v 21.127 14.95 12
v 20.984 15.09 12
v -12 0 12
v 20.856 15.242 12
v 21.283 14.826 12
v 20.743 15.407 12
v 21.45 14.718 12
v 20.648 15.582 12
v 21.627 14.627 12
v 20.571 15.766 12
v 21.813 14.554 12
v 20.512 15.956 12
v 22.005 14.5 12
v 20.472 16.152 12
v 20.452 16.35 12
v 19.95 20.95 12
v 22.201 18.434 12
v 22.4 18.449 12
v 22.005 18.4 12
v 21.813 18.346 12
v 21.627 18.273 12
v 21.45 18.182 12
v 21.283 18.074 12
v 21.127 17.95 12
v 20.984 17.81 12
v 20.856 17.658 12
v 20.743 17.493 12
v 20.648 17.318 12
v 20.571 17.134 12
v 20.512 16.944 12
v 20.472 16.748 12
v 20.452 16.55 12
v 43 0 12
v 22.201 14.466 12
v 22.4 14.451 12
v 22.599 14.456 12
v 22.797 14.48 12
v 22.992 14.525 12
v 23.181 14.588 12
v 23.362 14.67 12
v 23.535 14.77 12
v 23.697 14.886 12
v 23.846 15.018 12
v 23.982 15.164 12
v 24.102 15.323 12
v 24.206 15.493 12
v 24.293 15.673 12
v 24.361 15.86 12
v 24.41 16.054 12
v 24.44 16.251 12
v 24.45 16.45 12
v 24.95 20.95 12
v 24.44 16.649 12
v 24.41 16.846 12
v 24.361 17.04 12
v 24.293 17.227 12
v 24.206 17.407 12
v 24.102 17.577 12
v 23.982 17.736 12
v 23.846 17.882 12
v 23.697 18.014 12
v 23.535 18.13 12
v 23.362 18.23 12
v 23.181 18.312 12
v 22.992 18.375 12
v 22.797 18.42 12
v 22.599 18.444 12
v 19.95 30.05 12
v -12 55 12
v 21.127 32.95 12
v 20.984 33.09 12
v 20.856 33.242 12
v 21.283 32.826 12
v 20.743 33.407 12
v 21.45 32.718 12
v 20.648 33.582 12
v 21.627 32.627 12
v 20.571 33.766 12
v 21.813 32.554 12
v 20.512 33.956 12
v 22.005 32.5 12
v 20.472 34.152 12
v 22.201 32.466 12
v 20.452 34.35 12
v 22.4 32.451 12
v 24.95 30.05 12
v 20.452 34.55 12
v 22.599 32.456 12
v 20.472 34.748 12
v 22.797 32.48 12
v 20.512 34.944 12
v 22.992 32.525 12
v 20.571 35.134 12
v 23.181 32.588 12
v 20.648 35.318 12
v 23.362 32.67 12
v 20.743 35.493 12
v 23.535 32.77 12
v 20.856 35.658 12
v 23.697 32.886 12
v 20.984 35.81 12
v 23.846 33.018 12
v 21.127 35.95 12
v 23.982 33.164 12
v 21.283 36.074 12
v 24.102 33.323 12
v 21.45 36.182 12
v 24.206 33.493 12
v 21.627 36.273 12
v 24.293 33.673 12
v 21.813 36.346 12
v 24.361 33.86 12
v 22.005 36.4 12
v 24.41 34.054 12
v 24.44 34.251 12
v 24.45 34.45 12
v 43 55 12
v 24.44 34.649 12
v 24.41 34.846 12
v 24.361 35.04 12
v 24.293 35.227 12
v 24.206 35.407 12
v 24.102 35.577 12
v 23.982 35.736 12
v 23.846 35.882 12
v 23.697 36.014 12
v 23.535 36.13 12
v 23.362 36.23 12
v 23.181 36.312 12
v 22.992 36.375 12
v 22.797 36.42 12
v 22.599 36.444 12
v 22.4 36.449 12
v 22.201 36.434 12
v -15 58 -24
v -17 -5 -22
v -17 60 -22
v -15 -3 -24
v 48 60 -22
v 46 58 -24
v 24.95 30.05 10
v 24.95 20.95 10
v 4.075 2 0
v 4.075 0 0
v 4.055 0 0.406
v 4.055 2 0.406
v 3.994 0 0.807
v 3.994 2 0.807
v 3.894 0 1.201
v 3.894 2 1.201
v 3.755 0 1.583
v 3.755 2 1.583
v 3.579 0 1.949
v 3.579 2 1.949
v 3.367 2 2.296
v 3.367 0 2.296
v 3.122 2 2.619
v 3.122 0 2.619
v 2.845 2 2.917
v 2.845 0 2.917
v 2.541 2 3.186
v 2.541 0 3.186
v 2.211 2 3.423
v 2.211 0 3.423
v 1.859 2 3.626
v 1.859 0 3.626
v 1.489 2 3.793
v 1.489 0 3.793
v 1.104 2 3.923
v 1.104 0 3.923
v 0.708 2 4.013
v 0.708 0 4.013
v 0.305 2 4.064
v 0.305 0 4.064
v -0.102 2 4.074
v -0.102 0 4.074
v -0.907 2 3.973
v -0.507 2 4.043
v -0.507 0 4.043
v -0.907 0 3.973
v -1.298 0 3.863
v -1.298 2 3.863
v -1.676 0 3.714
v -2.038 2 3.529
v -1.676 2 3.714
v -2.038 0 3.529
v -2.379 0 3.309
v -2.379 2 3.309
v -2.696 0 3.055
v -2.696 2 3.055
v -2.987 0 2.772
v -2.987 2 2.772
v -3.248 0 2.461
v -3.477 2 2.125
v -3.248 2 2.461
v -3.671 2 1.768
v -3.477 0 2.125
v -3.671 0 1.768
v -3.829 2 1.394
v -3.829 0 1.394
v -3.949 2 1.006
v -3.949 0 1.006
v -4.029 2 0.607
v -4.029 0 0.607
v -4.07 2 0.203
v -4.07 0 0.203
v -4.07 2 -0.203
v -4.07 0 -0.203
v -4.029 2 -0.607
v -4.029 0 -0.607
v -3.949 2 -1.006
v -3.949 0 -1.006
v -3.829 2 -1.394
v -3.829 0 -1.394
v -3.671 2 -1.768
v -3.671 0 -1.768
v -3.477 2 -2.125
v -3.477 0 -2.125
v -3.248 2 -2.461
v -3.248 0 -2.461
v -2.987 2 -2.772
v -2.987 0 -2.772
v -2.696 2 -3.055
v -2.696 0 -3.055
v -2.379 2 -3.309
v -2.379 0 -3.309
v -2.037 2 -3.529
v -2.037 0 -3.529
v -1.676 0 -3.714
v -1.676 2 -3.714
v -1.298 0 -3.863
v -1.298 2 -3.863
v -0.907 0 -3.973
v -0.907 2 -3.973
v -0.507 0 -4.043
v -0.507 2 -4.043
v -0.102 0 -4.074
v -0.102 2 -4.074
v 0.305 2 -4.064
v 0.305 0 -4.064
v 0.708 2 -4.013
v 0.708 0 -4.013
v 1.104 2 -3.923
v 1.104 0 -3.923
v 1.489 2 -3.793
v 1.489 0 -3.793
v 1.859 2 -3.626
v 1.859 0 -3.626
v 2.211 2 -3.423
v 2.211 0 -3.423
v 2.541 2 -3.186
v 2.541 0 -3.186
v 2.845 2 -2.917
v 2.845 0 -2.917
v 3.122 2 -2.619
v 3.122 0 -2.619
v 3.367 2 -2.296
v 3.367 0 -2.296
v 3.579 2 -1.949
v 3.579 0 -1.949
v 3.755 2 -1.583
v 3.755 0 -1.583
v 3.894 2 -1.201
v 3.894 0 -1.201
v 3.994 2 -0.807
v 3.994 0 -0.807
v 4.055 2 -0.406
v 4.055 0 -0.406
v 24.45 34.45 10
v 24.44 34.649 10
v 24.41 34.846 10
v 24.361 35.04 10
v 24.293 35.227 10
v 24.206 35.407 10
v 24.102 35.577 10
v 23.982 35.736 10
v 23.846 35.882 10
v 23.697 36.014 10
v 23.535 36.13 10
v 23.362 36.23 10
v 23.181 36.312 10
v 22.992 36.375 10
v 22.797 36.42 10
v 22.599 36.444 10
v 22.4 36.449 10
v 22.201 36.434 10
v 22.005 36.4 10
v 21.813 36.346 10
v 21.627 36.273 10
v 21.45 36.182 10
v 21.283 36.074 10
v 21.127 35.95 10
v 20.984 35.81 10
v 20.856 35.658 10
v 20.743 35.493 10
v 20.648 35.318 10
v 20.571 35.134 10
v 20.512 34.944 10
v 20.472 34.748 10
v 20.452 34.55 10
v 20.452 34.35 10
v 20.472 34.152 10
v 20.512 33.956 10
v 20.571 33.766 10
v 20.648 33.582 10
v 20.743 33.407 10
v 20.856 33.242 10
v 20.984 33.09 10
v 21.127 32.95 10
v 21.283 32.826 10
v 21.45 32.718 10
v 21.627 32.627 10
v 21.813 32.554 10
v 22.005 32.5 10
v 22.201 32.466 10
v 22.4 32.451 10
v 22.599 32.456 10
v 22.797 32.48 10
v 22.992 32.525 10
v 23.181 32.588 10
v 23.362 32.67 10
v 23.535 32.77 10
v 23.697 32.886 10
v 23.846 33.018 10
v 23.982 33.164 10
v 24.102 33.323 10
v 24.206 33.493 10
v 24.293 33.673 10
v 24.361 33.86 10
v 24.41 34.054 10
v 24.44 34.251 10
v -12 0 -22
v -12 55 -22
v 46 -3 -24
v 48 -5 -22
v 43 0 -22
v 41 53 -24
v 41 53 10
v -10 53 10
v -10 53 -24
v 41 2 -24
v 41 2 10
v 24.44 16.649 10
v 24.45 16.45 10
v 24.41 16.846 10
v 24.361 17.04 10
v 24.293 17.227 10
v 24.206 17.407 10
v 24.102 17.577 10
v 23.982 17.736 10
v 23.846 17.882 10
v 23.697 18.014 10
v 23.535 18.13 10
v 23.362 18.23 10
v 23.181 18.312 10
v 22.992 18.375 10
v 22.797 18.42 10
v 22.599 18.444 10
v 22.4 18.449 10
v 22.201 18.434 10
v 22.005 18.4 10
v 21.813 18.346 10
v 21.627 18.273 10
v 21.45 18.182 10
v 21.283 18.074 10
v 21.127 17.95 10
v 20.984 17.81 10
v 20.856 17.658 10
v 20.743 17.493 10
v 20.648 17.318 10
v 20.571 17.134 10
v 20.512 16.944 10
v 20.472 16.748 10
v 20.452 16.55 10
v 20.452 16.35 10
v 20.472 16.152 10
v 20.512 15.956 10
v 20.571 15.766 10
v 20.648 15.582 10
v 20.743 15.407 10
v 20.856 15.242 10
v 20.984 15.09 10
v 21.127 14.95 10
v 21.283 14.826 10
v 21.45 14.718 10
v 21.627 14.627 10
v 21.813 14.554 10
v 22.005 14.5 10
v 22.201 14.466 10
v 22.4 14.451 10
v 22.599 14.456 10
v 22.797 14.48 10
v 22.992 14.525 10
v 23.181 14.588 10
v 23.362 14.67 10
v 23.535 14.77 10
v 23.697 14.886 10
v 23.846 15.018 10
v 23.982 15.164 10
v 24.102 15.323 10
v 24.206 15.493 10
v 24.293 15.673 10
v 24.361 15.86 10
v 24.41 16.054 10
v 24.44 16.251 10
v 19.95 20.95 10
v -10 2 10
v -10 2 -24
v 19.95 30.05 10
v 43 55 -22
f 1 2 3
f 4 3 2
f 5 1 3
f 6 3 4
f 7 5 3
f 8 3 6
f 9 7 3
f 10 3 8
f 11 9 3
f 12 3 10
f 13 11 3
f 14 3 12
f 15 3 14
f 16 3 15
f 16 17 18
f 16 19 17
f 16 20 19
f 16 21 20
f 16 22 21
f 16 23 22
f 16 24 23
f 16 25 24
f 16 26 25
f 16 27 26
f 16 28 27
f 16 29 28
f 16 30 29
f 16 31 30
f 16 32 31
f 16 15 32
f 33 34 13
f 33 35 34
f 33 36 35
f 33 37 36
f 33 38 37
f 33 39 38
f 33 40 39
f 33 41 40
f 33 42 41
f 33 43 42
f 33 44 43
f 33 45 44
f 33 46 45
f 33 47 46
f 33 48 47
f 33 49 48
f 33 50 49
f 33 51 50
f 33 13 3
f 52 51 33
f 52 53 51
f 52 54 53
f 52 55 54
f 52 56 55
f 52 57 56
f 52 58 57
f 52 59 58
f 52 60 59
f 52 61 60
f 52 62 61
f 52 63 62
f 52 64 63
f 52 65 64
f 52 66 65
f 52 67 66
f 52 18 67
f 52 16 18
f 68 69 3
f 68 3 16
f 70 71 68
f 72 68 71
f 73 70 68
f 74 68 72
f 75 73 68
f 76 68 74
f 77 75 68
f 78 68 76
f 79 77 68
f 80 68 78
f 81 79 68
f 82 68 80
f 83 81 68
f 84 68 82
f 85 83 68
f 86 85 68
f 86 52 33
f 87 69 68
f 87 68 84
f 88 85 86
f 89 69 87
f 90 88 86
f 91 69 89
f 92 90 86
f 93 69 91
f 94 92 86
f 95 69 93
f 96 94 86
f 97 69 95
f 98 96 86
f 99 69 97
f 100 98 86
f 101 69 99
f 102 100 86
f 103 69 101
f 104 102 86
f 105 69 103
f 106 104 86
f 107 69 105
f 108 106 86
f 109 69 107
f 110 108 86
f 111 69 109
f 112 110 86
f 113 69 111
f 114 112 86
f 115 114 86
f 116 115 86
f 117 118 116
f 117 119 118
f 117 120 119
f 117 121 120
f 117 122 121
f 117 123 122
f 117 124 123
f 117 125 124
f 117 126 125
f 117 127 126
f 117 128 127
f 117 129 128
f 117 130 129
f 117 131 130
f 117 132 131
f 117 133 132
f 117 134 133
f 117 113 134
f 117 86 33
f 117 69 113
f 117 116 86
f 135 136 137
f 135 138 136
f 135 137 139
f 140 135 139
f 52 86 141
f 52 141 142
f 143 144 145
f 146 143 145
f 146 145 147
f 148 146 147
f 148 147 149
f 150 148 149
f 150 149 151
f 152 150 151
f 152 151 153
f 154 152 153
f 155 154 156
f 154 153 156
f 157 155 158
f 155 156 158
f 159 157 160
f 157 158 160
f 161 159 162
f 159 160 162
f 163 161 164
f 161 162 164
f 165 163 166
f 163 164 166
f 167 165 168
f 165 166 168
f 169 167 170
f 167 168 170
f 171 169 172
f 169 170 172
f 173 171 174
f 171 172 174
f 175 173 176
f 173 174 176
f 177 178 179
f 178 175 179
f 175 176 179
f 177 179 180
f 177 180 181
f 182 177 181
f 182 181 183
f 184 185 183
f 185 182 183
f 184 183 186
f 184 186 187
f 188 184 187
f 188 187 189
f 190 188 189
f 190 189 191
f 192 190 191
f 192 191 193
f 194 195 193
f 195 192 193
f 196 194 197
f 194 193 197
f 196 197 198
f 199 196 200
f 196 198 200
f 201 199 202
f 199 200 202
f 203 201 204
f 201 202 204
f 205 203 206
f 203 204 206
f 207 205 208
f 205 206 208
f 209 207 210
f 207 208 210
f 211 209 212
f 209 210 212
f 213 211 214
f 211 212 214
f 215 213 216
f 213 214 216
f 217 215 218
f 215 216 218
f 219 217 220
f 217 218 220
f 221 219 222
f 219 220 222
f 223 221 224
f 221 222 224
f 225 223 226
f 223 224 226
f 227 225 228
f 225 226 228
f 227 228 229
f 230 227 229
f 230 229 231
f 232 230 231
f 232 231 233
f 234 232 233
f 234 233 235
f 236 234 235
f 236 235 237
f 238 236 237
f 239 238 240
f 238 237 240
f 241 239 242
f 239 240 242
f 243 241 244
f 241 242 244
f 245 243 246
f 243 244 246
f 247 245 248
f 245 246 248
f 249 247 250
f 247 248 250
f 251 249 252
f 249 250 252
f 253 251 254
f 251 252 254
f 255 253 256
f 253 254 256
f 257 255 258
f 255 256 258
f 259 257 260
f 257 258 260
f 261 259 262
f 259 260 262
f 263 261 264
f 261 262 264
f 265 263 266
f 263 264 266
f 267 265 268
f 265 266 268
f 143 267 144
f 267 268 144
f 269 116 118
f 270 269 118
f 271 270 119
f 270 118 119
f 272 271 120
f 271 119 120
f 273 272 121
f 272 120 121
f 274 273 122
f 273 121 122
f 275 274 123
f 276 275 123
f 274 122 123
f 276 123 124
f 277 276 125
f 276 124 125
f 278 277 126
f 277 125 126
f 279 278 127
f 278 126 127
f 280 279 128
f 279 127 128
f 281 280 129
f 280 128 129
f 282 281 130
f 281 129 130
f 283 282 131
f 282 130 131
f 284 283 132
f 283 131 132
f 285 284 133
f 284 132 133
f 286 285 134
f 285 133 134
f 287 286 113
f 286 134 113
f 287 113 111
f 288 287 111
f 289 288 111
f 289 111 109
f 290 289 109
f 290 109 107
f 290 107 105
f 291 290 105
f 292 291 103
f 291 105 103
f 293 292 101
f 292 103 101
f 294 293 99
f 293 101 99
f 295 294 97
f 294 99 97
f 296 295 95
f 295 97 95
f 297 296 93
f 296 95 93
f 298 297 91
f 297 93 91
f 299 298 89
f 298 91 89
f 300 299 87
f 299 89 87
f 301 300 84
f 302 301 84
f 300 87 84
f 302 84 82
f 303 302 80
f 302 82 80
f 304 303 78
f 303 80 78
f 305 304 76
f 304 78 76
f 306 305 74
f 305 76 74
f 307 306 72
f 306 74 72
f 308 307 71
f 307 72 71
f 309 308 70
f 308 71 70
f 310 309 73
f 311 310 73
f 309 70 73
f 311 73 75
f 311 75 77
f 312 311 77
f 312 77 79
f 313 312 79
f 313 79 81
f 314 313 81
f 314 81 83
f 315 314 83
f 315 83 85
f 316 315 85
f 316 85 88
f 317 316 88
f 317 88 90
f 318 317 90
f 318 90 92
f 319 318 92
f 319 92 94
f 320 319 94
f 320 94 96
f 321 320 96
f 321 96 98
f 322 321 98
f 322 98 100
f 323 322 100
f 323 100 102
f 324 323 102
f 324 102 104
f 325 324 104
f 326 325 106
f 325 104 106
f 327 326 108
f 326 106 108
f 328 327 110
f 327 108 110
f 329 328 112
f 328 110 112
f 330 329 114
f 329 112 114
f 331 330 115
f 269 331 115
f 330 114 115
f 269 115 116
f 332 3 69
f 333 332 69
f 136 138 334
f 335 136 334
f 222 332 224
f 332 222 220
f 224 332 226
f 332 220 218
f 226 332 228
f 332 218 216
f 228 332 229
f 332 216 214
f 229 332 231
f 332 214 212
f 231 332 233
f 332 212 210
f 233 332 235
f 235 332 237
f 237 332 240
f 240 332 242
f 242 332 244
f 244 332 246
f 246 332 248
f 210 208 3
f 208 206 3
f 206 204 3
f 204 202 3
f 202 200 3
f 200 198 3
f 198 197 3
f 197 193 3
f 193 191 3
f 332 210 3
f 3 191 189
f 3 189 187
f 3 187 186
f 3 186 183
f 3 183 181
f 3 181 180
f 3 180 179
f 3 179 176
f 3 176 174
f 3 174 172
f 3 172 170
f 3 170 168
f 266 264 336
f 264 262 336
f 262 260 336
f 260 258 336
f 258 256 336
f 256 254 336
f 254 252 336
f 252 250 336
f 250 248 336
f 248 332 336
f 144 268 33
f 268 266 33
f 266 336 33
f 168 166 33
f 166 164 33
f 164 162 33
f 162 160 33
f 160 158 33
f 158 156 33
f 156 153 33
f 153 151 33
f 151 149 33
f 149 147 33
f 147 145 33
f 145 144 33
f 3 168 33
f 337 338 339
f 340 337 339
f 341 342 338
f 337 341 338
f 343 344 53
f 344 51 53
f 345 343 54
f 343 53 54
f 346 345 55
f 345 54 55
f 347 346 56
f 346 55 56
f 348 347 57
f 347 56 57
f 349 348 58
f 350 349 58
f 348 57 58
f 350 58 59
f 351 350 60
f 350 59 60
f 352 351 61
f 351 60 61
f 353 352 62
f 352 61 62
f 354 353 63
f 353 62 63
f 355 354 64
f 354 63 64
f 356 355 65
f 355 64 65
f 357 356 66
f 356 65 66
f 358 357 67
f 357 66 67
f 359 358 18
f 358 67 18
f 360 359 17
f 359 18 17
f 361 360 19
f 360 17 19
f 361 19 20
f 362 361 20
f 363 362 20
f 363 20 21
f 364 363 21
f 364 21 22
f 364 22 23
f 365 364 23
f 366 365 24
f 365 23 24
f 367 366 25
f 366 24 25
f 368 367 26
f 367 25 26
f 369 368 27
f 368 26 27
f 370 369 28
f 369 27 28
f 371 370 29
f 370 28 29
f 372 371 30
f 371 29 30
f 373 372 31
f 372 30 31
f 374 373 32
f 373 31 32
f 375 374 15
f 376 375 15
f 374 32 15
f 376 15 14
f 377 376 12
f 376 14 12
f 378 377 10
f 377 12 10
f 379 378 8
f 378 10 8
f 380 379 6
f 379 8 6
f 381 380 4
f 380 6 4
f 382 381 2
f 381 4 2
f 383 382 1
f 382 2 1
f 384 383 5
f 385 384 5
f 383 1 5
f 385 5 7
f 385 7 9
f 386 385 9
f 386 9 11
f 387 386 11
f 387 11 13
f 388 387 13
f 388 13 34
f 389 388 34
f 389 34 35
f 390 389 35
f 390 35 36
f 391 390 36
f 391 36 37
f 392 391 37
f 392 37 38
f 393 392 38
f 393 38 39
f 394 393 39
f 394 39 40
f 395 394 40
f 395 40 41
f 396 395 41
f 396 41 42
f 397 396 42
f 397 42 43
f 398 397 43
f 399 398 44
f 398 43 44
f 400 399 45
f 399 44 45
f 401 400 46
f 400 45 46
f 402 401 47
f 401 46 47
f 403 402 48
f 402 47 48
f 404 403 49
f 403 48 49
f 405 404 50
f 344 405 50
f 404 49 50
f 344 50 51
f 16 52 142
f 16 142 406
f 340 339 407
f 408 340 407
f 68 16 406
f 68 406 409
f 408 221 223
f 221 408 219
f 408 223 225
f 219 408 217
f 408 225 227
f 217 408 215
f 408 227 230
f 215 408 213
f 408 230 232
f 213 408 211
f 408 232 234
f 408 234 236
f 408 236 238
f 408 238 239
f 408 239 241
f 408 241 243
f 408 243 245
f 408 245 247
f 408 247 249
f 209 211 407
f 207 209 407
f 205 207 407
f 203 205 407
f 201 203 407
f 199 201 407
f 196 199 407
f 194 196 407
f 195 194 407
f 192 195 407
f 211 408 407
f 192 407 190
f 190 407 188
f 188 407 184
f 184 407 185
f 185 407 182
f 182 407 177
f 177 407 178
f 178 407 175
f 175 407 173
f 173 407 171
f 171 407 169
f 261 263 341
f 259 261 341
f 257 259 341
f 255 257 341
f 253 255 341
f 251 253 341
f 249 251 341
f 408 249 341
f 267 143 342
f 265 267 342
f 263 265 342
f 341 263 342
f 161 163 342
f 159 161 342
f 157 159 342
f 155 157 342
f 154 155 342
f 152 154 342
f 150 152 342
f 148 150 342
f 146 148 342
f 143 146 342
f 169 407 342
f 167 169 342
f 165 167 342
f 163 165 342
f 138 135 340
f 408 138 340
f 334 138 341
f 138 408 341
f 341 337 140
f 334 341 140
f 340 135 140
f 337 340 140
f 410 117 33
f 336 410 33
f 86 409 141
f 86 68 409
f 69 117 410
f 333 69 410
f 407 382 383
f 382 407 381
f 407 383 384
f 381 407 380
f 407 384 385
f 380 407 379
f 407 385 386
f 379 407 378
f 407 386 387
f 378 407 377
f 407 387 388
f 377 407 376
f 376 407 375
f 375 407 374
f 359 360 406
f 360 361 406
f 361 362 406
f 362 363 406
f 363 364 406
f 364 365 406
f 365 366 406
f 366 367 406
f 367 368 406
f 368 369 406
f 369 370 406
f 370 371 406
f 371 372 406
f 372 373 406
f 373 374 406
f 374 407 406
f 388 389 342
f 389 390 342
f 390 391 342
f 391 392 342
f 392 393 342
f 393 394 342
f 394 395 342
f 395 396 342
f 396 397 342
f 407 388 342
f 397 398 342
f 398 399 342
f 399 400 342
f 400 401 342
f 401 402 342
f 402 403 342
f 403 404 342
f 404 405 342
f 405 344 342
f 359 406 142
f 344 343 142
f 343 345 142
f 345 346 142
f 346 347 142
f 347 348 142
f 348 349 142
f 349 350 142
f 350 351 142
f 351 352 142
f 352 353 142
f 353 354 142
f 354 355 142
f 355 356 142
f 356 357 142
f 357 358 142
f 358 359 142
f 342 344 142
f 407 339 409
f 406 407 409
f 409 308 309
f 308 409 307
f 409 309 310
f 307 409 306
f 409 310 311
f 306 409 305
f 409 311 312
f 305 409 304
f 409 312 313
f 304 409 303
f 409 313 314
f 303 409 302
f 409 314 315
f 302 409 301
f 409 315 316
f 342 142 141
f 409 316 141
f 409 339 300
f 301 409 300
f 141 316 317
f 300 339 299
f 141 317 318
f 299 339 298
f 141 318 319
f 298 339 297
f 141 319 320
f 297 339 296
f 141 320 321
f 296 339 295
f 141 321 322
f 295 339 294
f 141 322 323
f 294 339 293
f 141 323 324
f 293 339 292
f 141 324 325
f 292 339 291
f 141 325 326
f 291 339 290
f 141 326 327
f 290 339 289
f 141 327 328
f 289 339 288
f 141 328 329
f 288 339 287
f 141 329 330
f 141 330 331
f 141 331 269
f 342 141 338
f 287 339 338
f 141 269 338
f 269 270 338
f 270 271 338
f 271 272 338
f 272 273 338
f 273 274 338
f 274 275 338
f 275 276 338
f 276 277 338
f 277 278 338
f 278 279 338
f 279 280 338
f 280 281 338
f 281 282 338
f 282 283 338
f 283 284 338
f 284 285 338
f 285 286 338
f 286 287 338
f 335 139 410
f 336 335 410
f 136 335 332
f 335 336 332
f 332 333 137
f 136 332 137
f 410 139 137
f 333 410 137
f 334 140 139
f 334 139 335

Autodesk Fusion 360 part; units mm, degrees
sketch "Sketch1" plane through (0, 0, 0) normal (0, 1, 0) x (1, 0, 0)
  circle A0 centre (0, 0) radius 4.075
  line L0 (26.5, -2.5) -> (17.4, -2.5)
  line L1 (17.4, -2.5) -> (17.4, 2.5)
  line L2 (17.4, 2.5) -> (26.5, 2.5)
  line L3 (26.5, 2.5) -> (26.5, -2.5)
  line L4 (26.5, -2.5) -> (17.4, 2.5) construction
  line L5 (17.4, -2.5) -> (26.5, 2.5) construction
  circle A1 centre (13, 0) radius 2
  circle A2 centre (31, 0) radius 2
  line L6 (-10, 10) -> (41, 10)
  line L7 (41, 10) -> (41, -10)
  line L8 (41, -10) -> (-10, -10)
  line L9 (-10, -10) -> (-10, 10)
  line L10 (-10, 10) -> (-12, 10)
  line L11 (-12, 10) -> (-12, -10)
  line L12 (-12, -10) -> (-10, -10)
  line L13 (-10, -10) -> (-10, 10)
  line L14 (41, 10) -> (43, 10)
  line L15 (43, 10) -> (43, -10)
  line L16 (43, -10) -> (41, -10)
  line L17 (41, -10) -> (41, 10)
  point P0 (21.95, 0)
  dimension "d1" = 8.15
  dimension "d2" = 9.1
  dimension "d3" = 5
  dimension "d4" = 4
  dimension "d5" = 4
  dimension "d6" = 18
  dimension "d7" = 9.05
  dimension "d9" = 13
  dimension "d10" = 10
  dimension "d11" = 10
  dimension "d12" = 10
  dimension "d13" = 10
  dimension "d16" = 51
extrude "Extrude2" add sketch "Sketch1" along normal blind 2 contours L6 L7 L8 L9 L13 L17 makes body 1
extrude "Extrude1" add sketch "Sketch1" along normal blind 2 separate body contours L6 L7 L8 L9 L13 L17 makes body 2
extrude "Extrude3" add sketch "Sketch1" along normal blind 55 contours L9 L10 L11 L12 L13 | L7 L14 L15 L16 L17 bodies 1 2
sketch "Sketch2" plane through (-10, 0, 0) normal (1, 0, 0) x (0, 0, -1)
  line L0 (-10, 2) -> (10, 2)
  line L1 (10, 2) -> (10, 55)
  line L2 (10, 55) -> (-10, 55)
  line L3 (-10, 55) -> (-10, 2)
  line L4 (-10, 55) -> (10, 55)
  line L5 (10, 55) -> (10, 53)
  line L6 (10, 53) -> (-10, 53)
  line L7 (-10, 53) -> (-10, 55)
  dimension "d21" = 2
extrude "Extrude4" add sketch "Sketch2" along normal up to surface (51 mm away) contours L1 L2 L3 L4 L5 L6 L7 bodies 1
sketch "Sketch3" plane through (0, 0, 10) normal (0, 0, 1) x (1, 0, 0)
  line L0 (41, 53) -> (41, 2)
  line L1 (41, 2) -> (-10, 2)
  line L2 (-10, 2) -> (-10, 53)
  line L3 (-10, 53) -> (41, 53)
  line L4 (43, 55) -> (-12, 55)
  line L5 (-12, 55) -> (-12, 0)
  line L6 (-12, 0) -> (43, 0)
  line L7 (43, 0) -> (43, 55)
extrude "Extrude5" add sketch "Sketch3" along normal blind 2 contours L0 L1 L2 L3 | L4 L5 L6 L7 bodies 1
sketch "Sketch4" plane through (0, 0, -10) normal (0, 0, -1) x (-1, 0, 0)
  line L0 (12, 55) -> (-43, 55)
  line L1 (-43, 55) -> (-43, 0)
  line L2 (-43, 0) -> (12, 0)
  line L3 (12, 0) -> (12, 55)
  line L4 (-41, 53) -> (10, 53)
  line L5 (10, 53) -> (10, 2)
  line L6 (10, 2) -> (-41, 2)
  line L7 (-41, 2) -> (-41, 53)
extrude "Extrude6" add sketch "Sketch4" along normal blind 14 bodies 1
sketch "Sketch5" plane through (43, 0, 0) normal (1, 0, 0) x (0, 0, -1)
  line L0 (-12, 0) -> (24, 0)
  line L1 (24, 0) -> (24, 55)
  line L2 (24, 55) -> (-12, 55)
  line L3 (-12, 55) -> (-12, 0)
  line L4 (24, 55) -> (22, 55)
  line L5 (22, 55) -> (22, 0)
  line L6 (22, 0) -> (24, 0)
  line L7 (24, 0) -> (24, 55)
extrude "Extrude7" add sketch "Sketch5" along normal blind 5 contours L0 L1 L2 L4 L5 L6 L7 bodies 1
sketch "Sketch6" plane through (-12, 0, 0) normal (-1, 0, 0) x (0, 0, 1)
  line L0 (-24, 0) -> (12, 0)
  line L1 (12, 0) -> (12, 55)
  line L2 (12, 55) -> (-24, 55)
  line L3 (-24, 55) -> (-24, 0)
  line L4 (-24, 55) -> (-22, 55)
  line L5 (-22, 55) -> (-22, 0)
  line L6 (-22, 0) -> (-24, 0)
  line L7 (-24, 0) -> (-24, 55)
  point P0 (-22, 0)
extrude "Extrude8" add sketch "Sketch6" along normal blind 5 contours L0 L2 L3 L4 L5 L6 L7 bodies 1
sketch "Sketch7" plane through (0, 55, 0) normal (0, 1, 0) x (-1, 0, 0)
  line L0 (-48, -24) -> (17, -24)
  line L1 (17, -24) -> (17, -22)
  line L2 (17, -22) -> (12, -22)
  line L3 (12, -22) -> (12, 12)
  line L4 (12, 12) -> (-43, 12)
  line L5 (-43, 12) -> (-43, -22)
  line L6 (-43, -22) -> (-48, -22)
  line L7 (-48, -22) -> (-48, -24)
  line L8 (17, -22) -> (-48, -22)
  line L9 (-48, -22) -> (-48, -24)
  line L10 (-48, -24) -> (17, -24)
  line L11 (17, -24) -> (17, -22)
extrude "Extrude9" add sketch "Sketch7" along normal blind 5 contours L0 L1 L2 L6 L7 L8 L9 L10 L11 bodies 1
sketch "Sketch8" plane through (0, 0, 0) normal (0, -1, 0) x (1, 0, 0)
  circle A0 centre (0, 0) radius 4.075
  circle A1 centre (31, 0) radius 2
  line L0 (26.5, -2.5) -> (17.4, -2.5)
  line L1 (17.4, -2.5) -> (17.4, 2.5)
  line L2 (17.4, 2.5) -> (26.5, 2.5)
  line L3 (26.5, 2.5) -> (26.5, -2.5)
  circle A2 centre (13, 0) radius 2
  line L4 (-12, 12) -> (-12, -22)
  line L5 (-12, -22) -> (-17, -22)
  line L6 (-17, -22) -> (-17, -24)
  line L7 (-17, -24) -> (48, -24)
  line L8 (48, -24) -> (48, -22)
  line L9 (48, -22) -> (43, -22)
  line L10 (43, -22) -> (43, 12)
  line L11 (43, 12) -> (-12, 12)
  line L12 (-17, -24) -> (48, -24)
  line L13 (48, -24) -> (48, -22)
  line L14 (48, -22) -> (-17, -22)
  line L15 (-17, -22) -> (-17, -24)
extrude "Extrude10" add sketch "Sketch8" along normal blind 5 contours L5 L6 L7 L8 L9 L12 L13 L14 L15 bodies 1
chamfer "Chamfer1" distance 2 angle 45 4 edges at (-17, 27.5, -24) (15.5, 60, -24) (48, 27.5, -24) (15.5, -5, -24) on bodies 1
sketch "Sketch9" plane through (0, 0, 0) normal (0, 1, 0) x (-1, 0, 0)
sketch "Sketch10" plane through (0, 0, 12) normal (0, 0, 1) x (1, 0, 0)
  line L0 (43, 0) -> (43, 55)
  line L1 (43, 55) -> (-12, 55)
  line L2 (-12, 55) -> (-12, 0)
  line L3 (-12, 0) -> (43, 0)
  line L4 (19.95, 20.95) -> (19.95, 30.05)
  line L5 (19.95, 30.05) -> (24.95, 30.05)
  line L6 (24.95, 30.05) -> (24.95, 20.95)
  line L7 (24.95, 20.95) -> (19.95, 20.95)
  circle A0 centre (22.45, 16.45) radius 2
  circle A1 centre (22.45, 34.45) radius 2
  dimension "d37" = 9.1
  dimension "d38" = 5
  dimension "d39" = 4
  dimension "d40" = 4
  dimension "d41" = 18
extrude "Extrude11" cut sketch "Sketch10" against normal blind 2 contours L4 L5 L6 L7 | A0 | A1 bodies 1
extrude "Extrude12" add sketch "Sketch1" along normal blind 2 contours L0 L1 L2 L3 | A1 | A2 bodies 1
